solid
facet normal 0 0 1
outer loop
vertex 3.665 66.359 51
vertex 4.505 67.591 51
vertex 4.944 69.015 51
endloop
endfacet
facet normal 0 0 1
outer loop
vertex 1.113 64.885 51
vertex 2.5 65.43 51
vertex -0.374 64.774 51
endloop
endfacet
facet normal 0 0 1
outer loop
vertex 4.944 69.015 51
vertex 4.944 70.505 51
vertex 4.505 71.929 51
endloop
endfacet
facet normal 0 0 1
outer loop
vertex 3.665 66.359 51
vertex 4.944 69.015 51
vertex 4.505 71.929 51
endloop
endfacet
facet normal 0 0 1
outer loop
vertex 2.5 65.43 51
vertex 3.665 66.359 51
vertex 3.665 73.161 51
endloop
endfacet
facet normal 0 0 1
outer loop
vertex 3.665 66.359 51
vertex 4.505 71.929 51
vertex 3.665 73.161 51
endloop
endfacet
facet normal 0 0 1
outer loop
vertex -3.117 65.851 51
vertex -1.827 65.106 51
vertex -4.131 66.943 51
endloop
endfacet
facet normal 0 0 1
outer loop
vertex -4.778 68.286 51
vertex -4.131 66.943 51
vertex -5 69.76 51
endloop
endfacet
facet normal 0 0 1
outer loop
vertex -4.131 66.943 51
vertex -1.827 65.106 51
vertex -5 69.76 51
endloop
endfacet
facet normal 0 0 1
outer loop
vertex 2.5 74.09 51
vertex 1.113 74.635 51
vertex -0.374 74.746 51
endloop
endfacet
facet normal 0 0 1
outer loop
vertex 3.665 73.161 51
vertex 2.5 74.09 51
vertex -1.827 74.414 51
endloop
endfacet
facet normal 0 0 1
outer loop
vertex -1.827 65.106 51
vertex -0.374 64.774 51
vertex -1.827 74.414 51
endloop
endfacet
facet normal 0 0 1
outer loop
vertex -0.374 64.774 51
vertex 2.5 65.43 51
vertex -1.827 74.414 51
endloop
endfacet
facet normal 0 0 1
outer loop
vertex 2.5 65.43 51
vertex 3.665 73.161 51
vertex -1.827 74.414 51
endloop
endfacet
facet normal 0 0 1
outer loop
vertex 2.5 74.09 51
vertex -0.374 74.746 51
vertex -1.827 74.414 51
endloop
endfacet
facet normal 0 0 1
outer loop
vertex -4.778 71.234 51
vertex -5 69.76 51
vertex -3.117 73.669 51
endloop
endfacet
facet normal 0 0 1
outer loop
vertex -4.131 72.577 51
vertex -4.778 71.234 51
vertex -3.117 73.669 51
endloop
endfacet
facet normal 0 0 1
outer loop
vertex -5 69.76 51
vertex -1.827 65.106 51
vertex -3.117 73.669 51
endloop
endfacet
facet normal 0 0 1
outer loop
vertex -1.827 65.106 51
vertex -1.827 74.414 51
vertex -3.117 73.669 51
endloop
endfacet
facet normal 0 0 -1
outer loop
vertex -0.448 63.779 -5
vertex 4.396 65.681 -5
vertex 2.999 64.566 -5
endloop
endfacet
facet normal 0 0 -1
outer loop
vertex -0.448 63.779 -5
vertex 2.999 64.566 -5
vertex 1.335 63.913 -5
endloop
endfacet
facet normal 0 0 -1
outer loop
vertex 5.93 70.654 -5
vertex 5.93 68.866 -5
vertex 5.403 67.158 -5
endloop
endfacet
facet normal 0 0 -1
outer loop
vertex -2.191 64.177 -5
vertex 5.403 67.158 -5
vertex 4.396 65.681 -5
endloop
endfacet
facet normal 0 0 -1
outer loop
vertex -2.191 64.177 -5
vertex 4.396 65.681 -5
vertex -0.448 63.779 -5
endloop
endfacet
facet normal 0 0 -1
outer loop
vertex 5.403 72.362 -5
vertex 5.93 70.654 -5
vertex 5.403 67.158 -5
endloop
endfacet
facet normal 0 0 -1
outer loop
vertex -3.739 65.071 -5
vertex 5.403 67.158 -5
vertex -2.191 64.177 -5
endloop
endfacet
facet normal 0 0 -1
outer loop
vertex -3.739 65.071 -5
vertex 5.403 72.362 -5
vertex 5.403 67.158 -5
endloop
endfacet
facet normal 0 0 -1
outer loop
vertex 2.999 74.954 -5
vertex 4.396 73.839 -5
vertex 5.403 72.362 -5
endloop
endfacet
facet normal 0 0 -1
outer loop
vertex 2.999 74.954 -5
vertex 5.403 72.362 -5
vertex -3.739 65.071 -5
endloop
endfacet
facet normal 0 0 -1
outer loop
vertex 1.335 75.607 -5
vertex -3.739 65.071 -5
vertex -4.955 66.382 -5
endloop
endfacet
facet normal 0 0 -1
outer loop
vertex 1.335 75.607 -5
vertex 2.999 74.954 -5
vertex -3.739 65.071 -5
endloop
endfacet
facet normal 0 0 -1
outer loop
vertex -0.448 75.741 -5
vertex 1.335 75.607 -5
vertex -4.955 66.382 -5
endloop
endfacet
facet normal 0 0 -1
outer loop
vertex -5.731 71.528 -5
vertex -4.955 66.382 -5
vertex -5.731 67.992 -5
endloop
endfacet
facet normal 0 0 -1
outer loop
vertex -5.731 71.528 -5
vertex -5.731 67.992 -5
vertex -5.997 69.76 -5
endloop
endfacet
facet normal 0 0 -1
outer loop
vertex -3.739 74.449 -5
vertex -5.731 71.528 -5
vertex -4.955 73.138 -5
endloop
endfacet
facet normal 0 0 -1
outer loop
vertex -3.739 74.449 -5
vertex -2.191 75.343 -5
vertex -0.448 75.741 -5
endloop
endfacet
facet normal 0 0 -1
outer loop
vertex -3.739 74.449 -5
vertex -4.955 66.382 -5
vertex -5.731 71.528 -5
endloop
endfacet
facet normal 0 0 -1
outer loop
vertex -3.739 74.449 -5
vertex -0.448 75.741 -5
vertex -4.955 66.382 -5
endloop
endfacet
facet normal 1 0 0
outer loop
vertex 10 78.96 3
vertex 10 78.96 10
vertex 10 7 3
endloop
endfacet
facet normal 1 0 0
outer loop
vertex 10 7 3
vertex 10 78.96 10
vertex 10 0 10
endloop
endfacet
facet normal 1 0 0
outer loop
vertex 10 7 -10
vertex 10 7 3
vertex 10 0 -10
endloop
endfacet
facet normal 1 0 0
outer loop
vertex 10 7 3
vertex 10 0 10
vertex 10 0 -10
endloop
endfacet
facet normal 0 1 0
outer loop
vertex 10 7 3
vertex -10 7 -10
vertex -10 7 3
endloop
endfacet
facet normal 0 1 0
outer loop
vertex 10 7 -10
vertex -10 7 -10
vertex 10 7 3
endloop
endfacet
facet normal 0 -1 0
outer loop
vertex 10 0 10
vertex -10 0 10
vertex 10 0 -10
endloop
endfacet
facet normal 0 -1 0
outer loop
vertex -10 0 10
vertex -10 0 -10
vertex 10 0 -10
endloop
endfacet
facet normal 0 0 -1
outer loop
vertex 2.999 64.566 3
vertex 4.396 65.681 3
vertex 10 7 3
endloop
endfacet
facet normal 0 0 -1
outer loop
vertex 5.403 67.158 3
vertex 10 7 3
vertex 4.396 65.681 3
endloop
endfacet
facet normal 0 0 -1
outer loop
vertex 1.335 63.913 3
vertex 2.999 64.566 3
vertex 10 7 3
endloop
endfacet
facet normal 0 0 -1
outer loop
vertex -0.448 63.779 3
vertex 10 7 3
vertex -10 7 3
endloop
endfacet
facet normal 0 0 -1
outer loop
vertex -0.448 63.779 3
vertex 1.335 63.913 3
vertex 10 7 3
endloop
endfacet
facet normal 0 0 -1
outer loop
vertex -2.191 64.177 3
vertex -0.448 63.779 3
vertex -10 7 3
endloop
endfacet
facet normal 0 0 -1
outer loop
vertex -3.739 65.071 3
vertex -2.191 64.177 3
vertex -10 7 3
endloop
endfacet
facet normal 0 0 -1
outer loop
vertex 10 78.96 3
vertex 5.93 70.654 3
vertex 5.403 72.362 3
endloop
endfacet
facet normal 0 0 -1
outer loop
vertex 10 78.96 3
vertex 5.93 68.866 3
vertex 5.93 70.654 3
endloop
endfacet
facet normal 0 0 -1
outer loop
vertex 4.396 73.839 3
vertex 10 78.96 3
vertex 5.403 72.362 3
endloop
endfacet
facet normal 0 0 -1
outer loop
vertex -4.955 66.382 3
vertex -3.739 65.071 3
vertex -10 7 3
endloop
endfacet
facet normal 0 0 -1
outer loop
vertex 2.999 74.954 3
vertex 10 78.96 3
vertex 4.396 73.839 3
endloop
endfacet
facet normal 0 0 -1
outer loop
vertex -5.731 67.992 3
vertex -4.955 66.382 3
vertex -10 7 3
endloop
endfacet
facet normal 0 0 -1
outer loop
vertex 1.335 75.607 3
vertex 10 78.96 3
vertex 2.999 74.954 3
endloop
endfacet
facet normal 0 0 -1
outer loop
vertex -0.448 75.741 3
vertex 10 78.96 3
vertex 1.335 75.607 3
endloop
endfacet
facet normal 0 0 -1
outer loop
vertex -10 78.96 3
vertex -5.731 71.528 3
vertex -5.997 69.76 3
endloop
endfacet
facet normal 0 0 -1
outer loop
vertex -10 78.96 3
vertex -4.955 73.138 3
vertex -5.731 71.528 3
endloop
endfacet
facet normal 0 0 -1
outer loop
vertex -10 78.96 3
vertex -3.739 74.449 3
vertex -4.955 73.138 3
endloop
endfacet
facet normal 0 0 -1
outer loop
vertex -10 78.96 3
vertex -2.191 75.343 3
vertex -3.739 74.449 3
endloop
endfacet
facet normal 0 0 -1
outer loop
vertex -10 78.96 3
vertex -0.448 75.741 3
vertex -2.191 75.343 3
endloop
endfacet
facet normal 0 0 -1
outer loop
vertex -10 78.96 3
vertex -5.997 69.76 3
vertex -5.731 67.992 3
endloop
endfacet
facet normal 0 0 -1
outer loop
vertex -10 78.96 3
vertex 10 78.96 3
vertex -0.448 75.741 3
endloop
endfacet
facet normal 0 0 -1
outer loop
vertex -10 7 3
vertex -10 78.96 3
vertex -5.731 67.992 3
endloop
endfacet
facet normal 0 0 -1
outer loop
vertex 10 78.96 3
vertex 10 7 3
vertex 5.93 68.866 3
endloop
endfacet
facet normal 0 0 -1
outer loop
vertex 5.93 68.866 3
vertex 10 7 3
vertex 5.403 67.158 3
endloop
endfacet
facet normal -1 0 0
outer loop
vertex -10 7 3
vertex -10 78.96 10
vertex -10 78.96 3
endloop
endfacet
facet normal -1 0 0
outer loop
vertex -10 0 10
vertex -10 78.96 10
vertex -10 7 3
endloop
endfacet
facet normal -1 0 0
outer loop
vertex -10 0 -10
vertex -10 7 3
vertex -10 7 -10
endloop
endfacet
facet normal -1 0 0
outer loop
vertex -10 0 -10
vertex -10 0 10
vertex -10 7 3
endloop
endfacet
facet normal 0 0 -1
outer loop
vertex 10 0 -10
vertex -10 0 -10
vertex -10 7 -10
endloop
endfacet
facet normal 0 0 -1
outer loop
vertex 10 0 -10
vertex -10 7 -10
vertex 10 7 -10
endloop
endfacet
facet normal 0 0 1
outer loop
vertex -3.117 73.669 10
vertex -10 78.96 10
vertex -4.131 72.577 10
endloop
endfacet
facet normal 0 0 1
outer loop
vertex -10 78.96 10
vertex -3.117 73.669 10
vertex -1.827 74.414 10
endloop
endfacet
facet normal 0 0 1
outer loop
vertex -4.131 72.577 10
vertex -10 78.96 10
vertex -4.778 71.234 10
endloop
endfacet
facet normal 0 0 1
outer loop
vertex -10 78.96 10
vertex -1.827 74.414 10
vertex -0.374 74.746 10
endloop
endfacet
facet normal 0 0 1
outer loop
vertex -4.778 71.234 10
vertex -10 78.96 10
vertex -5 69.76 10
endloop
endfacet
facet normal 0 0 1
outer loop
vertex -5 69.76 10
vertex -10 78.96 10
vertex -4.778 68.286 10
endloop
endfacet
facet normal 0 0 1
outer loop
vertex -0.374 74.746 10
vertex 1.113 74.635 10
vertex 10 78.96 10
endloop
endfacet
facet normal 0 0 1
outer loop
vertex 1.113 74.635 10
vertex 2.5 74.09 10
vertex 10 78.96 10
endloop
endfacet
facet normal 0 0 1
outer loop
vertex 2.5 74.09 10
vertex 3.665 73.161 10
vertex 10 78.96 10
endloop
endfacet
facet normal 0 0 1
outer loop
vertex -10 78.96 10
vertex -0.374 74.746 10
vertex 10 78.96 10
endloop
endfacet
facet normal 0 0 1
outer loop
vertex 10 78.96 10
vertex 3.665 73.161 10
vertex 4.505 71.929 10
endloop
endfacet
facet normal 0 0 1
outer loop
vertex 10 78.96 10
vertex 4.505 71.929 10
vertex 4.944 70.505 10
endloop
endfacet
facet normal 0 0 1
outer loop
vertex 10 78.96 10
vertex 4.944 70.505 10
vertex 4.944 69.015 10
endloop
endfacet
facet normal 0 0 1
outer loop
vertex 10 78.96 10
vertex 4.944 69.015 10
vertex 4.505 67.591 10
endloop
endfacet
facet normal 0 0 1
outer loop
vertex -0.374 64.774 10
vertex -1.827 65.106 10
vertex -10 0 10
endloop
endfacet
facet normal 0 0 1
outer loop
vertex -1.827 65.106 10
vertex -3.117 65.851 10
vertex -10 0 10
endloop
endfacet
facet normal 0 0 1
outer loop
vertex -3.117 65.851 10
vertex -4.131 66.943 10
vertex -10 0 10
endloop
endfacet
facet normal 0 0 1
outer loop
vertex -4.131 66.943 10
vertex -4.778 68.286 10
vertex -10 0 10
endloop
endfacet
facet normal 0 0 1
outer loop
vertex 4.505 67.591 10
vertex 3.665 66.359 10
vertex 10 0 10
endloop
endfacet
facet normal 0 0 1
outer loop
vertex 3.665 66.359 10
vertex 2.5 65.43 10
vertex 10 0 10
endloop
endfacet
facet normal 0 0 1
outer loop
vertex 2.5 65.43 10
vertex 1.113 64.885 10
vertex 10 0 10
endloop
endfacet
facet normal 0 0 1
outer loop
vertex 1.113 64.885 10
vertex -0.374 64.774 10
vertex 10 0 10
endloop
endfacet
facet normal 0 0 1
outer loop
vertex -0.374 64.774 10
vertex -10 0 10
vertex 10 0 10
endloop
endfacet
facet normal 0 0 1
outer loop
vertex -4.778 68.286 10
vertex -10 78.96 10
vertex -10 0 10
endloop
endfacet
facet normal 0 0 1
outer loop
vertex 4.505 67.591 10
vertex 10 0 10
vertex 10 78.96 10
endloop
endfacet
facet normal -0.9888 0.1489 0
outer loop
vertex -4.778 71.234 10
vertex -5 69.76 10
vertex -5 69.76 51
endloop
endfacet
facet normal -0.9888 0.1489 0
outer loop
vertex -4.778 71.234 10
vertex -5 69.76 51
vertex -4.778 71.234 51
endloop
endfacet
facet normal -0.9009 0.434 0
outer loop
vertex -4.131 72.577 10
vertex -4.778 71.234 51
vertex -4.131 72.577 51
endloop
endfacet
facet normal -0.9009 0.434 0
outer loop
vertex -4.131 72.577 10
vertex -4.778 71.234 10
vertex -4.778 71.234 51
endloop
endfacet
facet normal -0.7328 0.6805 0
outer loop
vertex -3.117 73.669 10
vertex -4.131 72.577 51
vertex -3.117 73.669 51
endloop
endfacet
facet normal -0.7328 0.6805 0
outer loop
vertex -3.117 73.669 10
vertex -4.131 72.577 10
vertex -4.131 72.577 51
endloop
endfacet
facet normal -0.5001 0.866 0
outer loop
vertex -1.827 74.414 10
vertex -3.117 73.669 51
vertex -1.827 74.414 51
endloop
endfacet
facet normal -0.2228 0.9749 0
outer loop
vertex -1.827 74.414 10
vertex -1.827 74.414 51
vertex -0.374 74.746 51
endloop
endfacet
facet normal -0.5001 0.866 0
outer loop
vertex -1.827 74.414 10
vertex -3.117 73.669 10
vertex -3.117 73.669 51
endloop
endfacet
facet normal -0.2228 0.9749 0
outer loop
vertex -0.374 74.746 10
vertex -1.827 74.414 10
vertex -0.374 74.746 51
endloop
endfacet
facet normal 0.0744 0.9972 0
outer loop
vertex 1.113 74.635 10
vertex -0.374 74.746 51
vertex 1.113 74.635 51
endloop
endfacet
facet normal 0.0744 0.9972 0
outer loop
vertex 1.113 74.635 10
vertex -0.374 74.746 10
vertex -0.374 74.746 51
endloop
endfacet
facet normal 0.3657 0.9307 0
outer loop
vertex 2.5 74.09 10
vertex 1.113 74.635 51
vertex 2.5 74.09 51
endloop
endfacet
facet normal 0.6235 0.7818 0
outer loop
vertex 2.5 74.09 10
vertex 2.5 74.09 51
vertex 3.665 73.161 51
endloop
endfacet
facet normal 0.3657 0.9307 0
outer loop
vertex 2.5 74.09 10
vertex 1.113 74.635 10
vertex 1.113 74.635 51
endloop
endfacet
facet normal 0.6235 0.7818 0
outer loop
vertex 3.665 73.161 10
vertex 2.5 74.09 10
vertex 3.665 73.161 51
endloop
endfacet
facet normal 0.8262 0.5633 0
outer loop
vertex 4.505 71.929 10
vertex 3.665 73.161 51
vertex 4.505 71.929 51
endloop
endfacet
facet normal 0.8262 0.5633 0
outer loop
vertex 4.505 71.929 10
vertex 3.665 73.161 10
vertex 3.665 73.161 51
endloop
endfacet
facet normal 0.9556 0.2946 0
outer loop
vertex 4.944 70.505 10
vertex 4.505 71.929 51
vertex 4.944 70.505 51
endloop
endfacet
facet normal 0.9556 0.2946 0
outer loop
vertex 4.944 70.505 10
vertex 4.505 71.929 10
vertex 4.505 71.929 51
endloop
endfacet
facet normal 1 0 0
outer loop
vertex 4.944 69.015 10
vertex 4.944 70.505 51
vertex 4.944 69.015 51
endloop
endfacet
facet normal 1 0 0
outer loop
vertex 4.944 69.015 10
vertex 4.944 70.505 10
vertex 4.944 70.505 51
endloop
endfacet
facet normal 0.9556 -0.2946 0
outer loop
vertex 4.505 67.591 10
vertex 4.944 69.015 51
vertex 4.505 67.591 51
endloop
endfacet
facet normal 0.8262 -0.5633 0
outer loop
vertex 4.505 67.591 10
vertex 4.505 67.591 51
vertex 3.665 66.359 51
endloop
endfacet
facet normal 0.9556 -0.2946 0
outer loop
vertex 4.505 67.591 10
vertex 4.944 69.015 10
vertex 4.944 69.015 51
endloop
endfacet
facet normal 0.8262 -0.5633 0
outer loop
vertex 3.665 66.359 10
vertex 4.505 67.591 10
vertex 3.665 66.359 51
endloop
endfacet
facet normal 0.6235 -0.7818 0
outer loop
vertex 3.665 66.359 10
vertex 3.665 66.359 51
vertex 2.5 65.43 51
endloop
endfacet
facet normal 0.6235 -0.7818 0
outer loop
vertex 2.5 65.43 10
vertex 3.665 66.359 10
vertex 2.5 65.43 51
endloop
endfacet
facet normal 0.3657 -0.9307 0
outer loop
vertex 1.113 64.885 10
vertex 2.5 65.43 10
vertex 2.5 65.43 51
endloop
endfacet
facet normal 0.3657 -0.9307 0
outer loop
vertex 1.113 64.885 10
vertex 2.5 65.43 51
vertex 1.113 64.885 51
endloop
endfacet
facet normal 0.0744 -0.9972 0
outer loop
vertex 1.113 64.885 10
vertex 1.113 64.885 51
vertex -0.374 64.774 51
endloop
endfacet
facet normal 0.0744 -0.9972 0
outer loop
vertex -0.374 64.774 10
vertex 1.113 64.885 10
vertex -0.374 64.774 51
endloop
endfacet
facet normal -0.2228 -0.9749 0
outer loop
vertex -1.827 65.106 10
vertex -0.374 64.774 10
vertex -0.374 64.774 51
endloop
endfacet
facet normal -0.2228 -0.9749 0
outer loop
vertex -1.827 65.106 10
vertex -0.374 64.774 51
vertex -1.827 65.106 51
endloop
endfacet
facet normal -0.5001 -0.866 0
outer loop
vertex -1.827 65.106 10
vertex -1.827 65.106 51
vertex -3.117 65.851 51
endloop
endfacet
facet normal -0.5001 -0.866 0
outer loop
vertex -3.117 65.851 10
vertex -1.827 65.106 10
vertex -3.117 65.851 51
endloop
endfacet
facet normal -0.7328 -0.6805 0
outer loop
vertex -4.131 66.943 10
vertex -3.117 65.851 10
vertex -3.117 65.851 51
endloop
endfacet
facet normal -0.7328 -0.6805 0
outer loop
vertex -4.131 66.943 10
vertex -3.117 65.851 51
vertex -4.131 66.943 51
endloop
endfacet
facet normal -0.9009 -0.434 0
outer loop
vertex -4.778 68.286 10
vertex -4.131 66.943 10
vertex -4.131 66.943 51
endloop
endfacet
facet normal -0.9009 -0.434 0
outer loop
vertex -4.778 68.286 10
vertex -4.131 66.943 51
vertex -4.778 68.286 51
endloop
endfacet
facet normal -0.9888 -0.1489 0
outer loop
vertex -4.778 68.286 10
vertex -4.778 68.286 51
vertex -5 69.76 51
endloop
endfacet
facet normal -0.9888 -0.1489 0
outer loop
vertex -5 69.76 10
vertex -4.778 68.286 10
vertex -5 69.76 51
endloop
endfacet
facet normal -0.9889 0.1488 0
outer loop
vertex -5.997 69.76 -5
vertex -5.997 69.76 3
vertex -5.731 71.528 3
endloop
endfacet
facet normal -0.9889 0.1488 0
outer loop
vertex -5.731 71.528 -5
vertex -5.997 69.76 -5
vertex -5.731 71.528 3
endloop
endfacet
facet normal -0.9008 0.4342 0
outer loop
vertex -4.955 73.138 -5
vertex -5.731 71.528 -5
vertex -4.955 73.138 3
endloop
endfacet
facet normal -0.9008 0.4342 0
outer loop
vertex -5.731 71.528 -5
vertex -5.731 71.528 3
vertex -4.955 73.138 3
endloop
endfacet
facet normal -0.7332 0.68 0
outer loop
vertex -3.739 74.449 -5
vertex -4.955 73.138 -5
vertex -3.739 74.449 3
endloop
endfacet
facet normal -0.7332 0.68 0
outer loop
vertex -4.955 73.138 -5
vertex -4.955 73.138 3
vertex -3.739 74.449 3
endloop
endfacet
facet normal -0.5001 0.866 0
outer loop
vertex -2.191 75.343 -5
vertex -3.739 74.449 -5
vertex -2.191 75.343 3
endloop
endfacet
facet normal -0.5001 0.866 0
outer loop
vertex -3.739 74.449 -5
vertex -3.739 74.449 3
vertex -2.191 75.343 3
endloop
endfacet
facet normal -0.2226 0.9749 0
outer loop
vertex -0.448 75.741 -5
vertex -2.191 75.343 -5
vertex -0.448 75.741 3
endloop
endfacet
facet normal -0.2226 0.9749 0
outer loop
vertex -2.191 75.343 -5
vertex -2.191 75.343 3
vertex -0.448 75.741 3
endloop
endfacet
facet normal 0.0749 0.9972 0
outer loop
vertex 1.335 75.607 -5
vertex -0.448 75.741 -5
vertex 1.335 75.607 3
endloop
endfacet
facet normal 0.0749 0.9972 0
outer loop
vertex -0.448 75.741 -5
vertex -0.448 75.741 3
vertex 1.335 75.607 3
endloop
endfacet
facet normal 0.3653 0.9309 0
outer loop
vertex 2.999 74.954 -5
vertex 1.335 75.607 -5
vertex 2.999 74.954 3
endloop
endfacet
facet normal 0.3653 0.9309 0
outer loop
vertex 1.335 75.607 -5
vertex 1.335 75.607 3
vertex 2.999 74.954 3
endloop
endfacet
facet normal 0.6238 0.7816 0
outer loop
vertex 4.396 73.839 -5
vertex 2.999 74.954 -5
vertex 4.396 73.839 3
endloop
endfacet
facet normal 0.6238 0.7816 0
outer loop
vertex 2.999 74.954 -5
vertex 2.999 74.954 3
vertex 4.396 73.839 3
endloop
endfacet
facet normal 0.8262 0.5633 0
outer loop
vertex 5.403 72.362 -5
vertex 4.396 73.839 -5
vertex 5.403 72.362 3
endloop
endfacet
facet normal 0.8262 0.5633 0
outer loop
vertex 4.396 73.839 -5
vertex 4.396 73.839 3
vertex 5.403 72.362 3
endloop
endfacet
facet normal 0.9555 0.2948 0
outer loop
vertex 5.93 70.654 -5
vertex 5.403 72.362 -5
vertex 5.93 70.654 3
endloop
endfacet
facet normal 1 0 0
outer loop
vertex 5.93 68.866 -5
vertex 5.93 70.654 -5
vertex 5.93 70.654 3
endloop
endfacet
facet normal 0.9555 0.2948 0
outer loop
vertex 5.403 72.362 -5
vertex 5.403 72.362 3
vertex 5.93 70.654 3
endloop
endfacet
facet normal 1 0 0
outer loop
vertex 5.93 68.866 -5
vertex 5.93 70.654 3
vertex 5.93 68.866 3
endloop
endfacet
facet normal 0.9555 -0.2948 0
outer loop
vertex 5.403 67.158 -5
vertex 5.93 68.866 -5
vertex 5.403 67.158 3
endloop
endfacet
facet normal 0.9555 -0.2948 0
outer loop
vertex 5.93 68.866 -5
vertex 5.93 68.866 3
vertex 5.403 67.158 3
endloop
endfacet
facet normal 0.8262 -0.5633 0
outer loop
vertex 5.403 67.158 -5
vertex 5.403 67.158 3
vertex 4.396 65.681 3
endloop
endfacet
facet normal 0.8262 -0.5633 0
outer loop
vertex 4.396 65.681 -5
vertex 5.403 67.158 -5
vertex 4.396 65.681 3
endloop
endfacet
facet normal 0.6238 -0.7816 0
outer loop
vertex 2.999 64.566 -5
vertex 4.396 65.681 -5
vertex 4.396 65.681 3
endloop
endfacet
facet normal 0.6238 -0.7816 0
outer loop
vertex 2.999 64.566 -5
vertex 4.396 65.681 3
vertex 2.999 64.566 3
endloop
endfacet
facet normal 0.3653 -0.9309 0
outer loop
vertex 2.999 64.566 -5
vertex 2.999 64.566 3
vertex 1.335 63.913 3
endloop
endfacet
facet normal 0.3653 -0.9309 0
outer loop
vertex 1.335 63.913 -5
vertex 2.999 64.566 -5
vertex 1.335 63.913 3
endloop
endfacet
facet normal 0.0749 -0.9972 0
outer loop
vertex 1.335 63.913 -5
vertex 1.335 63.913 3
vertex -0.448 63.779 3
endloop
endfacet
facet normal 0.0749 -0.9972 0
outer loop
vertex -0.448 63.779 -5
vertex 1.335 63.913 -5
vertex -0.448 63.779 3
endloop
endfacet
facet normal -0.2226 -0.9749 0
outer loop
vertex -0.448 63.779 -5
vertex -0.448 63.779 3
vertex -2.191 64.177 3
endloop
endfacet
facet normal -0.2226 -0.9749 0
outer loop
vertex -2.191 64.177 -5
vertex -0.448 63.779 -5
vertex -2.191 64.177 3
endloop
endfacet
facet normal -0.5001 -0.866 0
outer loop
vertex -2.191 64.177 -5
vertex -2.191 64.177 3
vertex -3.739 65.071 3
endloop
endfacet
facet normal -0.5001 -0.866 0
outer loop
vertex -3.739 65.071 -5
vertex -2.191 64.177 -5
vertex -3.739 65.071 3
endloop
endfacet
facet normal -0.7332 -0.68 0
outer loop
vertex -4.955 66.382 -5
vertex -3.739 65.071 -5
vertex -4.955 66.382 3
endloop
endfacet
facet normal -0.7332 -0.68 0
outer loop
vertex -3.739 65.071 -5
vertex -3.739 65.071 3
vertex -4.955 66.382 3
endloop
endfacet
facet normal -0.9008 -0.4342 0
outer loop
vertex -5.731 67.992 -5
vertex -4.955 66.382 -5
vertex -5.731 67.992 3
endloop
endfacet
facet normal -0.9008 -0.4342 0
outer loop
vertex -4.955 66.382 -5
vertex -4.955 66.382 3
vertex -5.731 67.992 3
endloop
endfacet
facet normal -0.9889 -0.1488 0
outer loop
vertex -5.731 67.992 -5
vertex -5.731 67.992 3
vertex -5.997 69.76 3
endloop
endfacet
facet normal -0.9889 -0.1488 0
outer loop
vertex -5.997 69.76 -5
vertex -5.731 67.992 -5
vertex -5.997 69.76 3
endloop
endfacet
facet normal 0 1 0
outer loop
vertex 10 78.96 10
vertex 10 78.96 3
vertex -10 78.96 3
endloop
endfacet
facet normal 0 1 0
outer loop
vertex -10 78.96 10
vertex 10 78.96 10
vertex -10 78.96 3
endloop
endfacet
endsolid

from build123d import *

# Parameters (mm, degrees)
SKETCH_2_W      = 20
SKETCH_2_H      = 20
EXTRUDE_2_DEPTH = 7
SKETCH_4_W      = 20
SKETCH_4_H      = 7
EXTRUDE_3_DEPTH = 78.96
SKETCH_5_R      = 5
EXTRUDE_4_DEPTH = 48
SKETCH_10_R     = 5.997428606
EXTRUDE_5_DEPTH = 8


with BuildPart() as part:
    # Эскиз2 → Бобышка-Вытянуть2 (new body)
    with BuildSketch(Plane(origin=(0, 0, 0), x_dir=(1, 0, 0), z_dir=(0, 1, 0))):
        Rectangle(SKETCH_2_W, SKETCH_2_H)
    extrude(amount=EXTRUDE_2_DEPTH)

    # Эскиз4 → Бобышка-Вытянуть3 (add)
    with BuildSketch(Plane(origin=(0, 0, 0), x_dir=(-1, 0, 0), z_dir=(0, -1, 0))):
        with Locations((0, -6.5)):
            Rectangle(SKETCH_4_W, SKETCH_4_H)
    extrude(amount=-EXTRUDE_3_DEPTH)

    # Эскиз5 → Бобышка-Вытянуть4 (add)
    with BuildSketch(Plane(origin=(0, 0, 3), x_dir=(-1, 0, 0), z_dir=(0, 0, -1))):
        with Locations((0, 69.76)):
            Circle(SKETCH_5_R)
    extrude(amount=-EXTRUDE_4_DEPTH)

    # Эскиз10 → Бобышка-Вытянуть5 (add)
    with BuildSketch(Plane(origin=(0, 0, 3), x_dir=(-1, 0, 0), z_dir=(0, 0, -1))):
        with Locations((0, 69.76)):
            Circle(SKETCH_10_R)
    extrude(amount=EXTRUDE_5_DEPTH)


solid = part.part
